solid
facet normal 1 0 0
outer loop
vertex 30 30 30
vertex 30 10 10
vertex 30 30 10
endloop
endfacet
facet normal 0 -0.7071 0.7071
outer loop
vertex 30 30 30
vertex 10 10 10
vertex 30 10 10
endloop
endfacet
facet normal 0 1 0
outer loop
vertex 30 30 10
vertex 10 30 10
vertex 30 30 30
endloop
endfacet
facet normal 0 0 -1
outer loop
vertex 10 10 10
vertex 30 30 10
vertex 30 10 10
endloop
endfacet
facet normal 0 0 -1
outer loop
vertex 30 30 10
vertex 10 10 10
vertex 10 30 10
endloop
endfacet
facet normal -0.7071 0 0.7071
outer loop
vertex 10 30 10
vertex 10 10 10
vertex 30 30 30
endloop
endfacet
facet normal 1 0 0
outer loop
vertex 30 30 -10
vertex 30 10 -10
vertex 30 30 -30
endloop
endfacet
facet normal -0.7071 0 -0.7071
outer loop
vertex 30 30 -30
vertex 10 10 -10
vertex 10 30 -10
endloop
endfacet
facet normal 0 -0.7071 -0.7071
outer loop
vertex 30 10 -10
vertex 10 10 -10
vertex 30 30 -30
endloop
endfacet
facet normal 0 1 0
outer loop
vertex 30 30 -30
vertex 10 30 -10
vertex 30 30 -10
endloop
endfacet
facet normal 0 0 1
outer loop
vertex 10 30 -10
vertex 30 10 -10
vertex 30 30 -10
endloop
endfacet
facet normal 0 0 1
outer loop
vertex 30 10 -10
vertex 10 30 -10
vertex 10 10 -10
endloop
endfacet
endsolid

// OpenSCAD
// Unit of length: Unit.MM
union()
{
   translate(v = [10.0, 10.0, 10.0])
   {
      polyhedron(points = [[20.0, 20.0, 0.0], [20.0, 0.0, 0.0], [0.0, 0.0, 0.0], [0.0, 20.0, 0.0], [20.0, 20.0, 20.0]], faces = [[0, 1, 4], [1, 2, 4], [2, 3, 4], [3, 0, 4], [1, 0, 3], [2, 1, 3]]);
   }
   mirror(v = [0.0, 0.0, 1.0])
   {
      translate(v = [10.0, 10.0, 10.0])
      {
         polyhedron(points = [[20.0, 20.0, 0.0], [20.0, 0.0, 0.0], [0.0, 0.0, 0.0], [0.0, 20.0, 0.0], [20.0, 20.0, 20.0]], faces = [[0, 1, 4], [1, 2, 4], [2, 3, 4], [3, 0, 4], [1, 0, 3], [2, 1, 3]]);
      }
   }
}
